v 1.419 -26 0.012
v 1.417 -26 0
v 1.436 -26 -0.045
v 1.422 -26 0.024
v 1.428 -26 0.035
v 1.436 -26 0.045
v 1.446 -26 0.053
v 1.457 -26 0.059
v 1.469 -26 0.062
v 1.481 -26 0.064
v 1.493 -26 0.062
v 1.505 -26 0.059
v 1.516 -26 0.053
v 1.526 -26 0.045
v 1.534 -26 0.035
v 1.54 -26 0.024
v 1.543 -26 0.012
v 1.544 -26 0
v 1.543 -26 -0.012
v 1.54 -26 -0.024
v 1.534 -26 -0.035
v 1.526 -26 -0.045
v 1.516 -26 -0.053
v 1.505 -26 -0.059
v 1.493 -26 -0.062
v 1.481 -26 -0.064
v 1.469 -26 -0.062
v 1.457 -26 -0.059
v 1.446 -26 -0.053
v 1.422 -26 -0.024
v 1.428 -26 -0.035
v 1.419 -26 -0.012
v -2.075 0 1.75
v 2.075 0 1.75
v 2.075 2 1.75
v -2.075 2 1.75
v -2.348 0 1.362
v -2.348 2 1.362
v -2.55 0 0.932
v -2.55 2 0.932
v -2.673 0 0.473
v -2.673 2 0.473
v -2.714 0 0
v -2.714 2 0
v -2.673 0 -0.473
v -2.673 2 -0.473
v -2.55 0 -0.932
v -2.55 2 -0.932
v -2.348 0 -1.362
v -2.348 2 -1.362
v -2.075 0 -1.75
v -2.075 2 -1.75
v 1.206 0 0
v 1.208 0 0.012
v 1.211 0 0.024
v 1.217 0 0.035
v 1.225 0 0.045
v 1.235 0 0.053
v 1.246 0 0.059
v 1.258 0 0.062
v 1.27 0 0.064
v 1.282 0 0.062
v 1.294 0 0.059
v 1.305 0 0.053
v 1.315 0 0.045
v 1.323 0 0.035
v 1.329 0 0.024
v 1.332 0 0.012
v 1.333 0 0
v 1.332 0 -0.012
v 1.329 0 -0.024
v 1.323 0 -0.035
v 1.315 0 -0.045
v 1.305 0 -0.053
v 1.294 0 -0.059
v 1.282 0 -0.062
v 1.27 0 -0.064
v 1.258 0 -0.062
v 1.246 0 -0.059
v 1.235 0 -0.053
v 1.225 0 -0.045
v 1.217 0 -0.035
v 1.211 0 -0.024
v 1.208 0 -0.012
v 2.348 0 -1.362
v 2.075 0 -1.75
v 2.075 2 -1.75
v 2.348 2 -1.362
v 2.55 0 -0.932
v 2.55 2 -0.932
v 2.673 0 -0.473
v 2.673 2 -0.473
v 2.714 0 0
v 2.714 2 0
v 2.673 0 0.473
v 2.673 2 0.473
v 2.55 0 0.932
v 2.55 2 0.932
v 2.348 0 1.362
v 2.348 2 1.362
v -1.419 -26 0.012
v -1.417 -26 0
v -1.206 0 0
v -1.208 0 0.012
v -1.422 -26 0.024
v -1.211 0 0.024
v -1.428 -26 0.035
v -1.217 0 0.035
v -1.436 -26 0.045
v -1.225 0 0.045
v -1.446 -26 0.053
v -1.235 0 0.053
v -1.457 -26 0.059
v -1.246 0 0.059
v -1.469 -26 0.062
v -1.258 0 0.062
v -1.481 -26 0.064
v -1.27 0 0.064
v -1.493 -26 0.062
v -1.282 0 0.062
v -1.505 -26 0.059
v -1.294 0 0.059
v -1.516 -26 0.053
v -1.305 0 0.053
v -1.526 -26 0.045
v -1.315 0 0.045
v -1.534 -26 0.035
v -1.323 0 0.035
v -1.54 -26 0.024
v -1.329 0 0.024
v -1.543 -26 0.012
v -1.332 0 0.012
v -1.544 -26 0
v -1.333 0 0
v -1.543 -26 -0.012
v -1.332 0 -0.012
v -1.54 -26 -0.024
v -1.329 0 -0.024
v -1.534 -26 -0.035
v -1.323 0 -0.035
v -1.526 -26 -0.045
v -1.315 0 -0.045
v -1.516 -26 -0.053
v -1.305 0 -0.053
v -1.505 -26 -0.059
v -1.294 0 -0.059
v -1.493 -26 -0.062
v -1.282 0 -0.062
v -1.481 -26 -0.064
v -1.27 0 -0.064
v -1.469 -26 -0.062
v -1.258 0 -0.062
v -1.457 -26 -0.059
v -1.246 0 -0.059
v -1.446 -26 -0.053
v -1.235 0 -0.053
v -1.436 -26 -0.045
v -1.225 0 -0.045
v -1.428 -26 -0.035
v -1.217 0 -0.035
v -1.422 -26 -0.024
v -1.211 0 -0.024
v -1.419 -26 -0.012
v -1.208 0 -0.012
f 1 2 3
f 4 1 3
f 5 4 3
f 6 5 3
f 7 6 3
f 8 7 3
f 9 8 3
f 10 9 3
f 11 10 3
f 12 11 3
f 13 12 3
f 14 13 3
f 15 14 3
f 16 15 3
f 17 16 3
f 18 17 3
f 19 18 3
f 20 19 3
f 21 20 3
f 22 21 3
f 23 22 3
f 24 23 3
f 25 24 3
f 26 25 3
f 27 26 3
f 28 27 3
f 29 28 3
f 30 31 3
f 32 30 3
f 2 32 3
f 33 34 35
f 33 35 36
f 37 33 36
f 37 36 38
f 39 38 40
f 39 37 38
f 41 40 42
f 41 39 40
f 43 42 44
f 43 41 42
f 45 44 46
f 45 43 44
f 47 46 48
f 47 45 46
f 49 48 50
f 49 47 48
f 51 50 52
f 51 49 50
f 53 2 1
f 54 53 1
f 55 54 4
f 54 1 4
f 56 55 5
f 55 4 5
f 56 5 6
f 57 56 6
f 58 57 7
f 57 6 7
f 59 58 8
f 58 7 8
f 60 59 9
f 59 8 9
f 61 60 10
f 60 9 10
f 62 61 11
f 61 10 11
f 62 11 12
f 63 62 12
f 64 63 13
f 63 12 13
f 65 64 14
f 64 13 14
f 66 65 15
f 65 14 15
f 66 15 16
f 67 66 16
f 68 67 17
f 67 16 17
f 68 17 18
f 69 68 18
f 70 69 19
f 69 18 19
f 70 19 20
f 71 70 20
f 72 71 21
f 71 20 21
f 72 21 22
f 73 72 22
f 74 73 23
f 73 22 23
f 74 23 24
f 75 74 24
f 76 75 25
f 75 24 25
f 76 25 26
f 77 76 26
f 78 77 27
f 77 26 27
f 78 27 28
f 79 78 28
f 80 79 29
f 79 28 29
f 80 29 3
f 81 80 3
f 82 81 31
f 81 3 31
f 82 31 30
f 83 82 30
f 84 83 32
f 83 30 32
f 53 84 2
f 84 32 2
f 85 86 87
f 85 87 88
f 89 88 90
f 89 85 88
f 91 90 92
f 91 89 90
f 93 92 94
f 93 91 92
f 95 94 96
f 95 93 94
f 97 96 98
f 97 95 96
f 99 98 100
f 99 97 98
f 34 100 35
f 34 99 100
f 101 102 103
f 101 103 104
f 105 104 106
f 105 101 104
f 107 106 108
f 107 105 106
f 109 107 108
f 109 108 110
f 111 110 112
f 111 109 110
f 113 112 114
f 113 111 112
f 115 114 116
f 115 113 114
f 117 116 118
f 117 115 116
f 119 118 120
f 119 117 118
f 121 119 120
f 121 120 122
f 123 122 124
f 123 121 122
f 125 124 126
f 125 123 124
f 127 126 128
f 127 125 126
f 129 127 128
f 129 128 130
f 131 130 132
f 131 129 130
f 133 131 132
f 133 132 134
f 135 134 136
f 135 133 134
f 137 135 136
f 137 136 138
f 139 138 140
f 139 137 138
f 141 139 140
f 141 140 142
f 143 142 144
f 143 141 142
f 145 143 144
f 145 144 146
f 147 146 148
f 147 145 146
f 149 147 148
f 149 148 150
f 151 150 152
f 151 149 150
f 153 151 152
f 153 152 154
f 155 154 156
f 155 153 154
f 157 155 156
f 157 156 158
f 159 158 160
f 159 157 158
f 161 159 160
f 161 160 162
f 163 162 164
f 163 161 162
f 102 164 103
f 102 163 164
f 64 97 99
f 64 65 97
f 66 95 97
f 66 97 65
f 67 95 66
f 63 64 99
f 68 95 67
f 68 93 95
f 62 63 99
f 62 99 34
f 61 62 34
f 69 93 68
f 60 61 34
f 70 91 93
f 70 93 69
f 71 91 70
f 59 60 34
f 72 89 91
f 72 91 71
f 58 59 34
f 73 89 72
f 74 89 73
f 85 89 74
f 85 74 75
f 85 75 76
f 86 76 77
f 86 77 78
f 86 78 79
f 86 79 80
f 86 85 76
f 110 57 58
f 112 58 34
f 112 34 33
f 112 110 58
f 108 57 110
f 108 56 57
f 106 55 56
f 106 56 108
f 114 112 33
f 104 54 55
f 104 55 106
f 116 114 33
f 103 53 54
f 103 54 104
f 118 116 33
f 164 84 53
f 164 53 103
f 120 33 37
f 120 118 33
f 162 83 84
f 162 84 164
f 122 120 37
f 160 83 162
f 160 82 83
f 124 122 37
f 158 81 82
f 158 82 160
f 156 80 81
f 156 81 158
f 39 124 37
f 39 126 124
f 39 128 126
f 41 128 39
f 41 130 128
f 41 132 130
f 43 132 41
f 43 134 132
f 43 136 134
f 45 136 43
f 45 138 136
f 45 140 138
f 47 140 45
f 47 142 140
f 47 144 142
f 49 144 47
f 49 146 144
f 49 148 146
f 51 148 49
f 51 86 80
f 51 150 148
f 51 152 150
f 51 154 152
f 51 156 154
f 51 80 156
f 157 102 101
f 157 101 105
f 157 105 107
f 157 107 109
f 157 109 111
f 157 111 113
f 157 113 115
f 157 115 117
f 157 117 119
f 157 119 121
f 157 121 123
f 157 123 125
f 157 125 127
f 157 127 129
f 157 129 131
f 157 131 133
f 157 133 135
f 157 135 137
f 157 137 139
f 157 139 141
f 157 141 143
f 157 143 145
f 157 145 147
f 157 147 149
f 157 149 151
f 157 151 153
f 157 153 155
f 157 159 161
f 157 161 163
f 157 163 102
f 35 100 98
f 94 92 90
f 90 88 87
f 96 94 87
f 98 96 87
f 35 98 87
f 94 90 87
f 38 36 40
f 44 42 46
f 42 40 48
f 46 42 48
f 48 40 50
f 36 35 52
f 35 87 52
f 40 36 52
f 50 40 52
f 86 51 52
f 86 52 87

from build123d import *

# Parameters (mm, degrees)
BOSS_EXTRUDE1_DEPTH = 2
SKETCH3_R           = 0.0635


with BuildPart() as part:
    # Sketch1 → Boss-Extrude1 (new body)
    with BuildSketch(Plane(origin=(0, 0, 0), x_dir=(1, 0, 0), z_dir=(0, 1, 0))):
        with BuildLine():
            Line((-2.075, 1.75), (2.075, 1.75))
            ThreePointArc((2.075, 1.75), (2.714429038, 0), (2.075, -1.75))
            Line((2.075, -1.75), (-2.075, -1.75))
            ThreePointArc((-2.075, -1.75), (-2.714429038, 0), (-2.075, 1.75))
        make_face()
    extrude(amount=BOSS_EXTRUDE1_DEPTH)

    # Sweep1: sweep along a path in Sketch2
    with BuildLine(Plane.XY) as sweep1_path:
        Line((-2.075, 0), (-2.286, -26))
    # Sketch3 → Sweep1 (sweep)
    with BuildSketch(Plane.XZ):
        with Locations((-1.27, 0)):
            Circle(SKETCH3_R)
    sweep1 = sweep(path=sweep1_path.line)

    # Mirror1: Sweep1 across plane
    add(sweep1.mirror(Plane(origin=(0, 0, 0), x_dir=(0, 0, 1), z_dir=(1, 0, 0))))


solid = part.part
